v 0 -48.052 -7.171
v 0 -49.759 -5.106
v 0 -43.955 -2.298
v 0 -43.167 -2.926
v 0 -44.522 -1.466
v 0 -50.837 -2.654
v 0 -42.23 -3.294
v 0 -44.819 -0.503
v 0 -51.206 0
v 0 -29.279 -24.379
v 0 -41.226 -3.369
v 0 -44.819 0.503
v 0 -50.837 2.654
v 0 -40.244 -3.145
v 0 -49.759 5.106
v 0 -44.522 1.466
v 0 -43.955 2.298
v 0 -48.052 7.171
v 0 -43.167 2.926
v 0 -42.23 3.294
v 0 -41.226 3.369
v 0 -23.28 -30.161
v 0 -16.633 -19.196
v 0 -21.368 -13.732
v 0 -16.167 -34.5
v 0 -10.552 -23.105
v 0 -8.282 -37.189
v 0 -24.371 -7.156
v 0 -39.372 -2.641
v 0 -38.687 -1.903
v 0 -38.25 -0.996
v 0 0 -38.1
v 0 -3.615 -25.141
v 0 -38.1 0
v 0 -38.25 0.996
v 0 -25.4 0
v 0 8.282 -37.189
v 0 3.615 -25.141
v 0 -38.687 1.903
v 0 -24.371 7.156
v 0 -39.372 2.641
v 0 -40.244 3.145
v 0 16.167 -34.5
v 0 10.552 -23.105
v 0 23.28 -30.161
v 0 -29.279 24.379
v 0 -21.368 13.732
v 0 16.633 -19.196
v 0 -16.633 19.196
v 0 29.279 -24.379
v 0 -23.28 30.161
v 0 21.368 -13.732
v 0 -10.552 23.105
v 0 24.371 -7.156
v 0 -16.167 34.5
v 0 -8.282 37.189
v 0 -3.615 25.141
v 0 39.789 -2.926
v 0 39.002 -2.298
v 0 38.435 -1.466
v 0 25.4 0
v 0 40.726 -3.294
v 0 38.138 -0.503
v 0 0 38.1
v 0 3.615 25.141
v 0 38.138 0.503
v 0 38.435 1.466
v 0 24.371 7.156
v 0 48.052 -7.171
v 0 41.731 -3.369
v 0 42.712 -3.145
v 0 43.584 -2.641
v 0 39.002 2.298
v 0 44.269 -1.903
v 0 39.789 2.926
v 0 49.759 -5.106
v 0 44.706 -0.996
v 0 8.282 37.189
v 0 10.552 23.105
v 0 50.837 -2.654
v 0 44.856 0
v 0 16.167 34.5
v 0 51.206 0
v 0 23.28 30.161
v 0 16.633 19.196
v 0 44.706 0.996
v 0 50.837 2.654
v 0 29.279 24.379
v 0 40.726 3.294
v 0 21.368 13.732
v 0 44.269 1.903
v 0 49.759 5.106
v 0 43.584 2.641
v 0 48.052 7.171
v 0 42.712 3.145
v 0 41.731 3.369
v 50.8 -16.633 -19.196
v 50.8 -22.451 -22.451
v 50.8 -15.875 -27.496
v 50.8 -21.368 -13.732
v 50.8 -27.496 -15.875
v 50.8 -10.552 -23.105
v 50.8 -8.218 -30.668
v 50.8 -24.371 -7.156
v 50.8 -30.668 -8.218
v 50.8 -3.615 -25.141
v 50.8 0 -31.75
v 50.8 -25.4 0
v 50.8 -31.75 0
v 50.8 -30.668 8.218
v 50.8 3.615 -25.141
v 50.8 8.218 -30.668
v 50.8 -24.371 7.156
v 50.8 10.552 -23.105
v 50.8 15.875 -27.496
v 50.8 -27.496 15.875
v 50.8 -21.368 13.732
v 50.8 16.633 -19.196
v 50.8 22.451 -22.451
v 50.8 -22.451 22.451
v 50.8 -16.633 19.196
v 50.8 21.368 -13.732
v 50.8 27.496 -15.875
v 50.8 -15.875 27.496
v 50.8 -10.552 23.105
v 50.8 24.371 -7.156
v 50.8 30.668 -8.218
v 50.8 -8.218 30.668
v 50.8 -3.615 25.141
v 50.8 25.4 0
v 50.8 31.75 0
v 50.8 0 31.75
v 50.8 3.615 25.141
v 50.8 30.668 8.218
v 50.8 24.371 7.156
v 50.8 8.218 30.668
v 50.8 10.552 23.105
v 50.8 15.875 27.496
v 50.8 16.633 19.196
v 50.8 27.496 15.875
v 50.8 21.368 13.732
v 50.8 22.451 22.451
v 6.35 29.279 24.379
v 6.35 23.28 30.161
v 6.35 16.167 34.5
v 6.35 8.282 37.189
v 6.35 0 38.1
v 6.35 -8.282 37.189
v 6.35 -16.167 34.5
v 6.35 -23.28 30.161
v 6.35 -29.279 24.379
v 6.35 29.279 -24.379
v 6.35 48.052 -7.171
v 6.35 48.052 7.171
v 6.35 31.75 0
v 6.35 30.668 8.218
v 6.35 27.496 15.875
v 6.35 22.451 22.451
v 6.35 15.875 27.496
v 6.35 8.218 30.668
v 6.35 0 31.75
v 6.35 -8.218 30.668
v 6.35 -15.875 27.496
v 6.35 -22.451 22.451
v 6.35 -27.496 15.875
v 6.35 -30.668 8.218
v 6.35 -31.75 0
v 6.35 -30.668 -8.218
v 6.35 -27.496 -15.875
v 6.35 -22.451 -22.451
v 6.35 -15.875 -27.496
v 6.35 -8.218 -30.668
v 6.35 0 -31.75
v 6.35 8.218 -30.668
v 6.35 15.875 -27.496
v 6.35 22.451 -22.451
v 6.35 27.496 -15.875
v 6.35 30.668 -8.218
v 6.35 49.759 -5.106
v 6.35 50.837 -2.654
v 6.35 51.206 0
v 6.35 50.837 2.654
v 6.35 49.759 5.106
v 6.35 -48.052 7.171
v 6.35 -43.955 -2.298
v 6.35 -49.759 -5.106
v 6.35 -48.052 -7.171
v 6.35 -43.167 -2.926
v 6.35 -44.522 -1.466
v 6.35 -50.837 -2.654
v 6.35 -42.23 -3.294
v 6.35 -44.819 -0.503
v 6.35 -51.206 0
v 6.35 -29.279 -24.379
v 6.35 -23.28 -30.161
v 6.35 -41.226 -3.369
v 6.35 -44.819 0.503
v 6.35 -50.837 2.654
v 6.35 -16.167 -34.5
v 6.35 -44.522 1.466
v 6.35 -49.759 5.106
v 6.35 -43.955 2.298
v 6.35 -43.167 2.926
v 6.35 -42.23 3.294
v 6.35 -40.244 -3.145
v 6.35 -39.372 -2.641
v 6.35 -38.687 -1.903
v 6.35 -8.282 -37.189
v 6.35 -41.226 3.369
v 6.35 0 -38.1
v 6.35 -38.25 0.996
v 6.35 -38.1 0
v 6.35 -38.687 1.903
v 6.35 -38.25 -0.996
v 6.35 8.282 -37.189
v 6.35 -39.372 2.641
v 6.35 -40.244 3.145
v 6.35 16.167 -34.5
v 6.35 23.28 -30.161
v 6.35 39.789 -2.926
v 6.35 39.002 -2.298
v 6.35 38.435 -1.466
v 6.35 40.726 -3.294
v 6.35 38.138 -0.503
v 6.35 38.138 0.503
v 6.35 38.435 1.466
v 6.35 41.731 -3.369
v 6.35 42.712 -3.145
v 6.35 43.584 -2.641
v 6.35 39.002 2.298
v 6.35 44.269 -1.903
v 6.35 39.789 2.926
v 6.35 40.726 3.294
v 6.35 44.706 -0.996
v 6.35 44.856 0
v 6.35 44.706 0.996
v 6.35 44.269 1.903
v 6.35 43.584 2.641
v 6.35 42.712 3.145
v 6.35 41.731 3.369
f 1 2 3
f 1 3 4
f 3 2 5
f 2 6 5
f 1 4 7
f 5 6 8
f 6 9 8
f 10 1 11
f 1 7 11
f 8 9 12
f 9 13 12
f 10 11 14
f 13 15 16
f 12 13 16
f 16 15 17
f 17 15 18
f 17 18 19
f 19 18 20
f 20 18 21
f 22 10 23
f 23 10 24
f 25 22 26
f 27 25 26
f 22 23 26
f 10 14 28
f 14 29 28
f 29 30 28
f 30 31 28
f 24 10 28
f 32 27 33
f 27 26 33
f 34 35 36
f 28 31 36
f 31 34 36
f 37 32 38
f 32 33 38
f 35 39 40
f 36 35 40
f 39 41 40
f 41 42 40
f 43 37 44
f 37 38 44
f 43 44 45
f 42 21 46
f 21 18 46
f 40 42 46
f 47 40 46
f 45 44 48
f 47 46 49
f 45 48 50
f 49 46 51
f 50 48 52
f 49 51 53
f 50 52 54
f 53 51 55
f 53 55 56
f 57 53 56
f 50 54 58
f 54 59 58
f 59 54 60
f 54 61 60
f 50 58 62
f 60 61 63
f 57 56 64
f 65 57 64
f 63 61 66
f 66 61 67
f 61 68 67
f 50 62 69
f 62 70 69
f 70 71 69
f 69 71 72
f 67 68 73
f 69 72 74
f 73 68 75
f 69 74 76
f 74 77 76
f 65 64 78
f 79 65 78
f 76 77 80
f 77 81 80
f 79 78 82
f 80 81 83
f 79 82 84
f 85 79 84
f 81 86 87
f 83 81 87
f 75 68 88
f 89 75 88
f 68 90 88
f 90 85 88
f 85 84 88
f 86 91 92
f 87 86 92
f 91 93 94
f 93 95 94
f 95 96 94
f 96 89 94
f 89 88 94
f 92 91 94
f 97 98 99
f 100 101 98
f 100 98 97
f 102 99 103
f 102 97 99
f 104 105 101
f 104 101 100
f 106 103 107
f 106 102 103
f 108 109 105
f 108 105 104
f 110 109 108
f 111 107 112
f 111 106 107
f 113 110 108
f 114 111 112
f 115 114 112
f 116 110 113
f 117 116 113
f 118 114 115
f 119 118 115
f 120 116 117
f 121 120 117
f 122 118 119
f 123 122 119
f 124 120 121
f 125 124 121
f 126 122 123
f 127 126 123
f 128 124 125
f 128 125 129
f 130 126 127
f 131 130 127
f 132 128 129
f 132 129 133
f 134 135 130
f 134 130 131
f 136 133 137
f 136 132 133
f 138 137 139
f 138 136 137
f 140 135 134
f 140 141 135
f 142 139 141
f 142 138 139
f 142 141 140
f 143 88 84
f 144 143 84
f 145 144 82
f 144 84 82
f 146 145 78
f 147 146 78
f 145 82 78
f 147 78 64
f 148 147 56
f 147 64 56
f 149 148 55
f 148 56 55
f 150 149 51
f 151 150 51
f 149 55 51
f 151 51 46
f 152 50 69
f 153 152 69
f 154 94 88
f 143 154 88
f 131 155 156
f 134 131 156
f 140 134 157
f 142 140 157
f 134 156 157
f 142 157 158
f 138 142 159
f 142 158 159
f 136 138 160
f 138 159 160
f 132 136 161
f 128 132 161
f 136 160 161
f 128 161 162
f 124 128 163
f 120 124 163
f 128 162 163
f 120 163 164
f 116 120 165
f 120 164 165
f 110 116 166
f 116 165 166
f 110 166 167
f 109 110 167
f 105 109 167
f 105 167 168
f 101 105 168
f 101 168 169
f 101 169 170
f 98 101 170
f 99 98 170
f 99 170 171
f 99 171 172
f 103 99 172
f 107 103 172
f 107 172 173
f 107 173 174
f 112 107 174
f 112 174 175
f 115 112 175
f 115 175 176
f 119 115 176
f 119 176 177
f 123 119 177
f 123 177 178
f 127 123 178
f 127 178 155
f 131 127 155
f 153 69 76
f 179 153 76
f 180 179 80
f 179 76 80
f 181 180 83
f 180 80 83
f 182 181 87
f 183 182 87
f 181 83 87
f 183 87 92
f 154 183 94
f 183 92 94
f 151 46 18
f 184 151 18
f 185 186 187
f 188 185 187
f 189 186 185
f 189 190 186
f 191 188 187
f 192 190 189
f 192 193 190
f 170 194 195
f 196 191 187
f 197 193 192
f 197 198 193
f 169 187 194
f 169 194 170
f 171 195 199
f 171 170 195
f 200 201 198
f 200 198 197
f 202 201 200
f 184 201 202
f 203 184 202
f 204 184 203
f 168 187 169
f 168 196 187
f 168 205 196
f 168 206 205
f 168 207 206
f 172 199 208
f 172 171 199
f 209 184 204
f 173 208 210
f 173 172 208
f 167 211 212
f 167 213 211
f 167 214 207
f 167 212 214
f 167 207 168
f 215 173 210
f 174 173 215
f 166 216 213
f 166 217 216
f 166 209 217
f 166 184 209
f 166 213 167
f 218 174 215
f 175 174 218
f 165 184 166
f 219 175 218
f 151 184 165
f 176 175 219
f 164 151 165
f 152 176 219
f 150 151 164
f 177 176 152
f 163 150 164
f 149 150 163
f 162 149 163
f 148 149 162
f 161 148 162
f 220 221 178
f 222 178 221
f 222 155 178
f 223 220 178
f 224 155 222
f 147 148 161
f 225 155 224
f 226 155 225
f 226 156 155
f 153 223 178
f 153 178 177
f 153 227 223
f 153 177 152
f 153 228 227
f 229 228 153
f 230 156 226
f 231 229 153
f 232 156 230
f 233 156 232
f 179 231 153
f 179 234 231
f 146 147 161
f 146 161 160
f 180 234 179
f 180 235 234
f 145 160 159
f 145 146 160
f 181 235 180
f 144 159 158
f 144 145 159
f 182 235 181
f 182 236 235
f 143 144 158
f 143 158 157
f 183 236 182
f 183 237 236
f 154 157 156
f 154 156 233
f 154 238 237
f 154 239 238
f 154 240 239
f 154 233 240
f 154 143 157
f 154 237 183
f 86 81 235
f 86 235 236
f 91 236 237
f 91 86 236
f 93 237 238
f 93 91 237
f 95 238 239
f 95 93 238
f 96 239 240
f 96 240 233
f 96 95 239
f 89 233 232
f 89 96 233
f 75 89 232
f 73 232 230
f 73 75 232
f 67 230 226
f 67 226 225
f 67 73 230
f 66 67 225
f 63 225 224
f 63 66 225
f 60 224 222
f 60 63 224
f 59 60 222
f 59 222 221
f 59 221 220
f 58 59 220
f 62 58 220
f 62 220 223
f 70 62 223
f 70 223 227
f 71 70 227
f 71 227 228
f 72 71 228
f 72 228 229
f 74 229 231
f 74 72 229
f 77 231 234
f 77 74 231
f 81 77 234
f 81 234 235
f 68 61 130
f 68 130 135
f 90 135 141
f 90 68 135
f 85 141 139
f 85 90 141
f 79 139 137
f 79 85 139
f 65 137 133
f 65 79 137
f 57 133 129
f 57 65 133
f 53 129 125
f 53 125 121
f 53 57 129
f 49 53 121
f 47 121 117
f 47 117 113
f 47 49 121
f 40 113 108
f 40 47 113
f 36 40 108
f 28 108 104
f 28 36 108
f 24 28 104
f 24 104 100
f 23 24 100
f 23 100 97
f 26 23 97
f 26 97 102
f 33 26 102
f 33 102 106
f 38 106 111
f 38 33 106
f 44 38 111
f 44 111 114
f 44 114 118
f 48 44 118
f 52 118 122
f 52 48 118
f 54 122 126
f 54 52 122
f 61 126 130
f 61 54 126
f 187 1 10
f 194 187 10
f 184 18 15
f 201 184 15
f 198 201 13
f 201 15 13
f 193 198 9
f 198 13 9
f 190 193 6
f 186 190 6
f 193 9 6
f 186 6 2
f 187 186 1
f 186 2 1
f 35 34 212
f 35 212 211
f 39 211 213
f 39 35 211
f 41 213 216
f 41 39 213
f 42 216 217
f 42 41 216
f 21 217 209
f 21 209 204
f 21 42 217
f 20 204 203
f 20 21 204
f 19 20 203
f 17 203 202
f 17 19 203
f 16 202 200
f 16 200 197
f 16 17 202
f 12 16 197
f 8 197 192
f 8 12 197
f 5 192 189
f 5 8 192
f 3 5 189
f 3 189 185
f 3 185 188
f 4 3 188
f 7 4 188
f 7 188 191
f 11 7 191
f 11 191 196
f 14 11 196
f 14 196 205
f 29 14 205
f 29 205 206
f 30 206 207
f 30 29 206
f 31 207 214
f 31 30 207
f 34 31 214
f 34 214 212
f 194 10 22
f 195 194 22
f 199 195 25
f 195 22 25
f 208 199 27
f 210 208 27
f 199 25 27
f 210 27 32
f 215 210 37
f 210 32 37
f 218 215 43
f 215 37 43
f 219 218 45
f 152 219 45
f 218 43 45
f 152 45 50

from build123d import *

# Parameters (mm, degrees)
F0_R     = 31.75
F0_R_2   = 25.4
F1_DEPTH = 50.8
F0_R_3   = 3.3782
F2_DEPTH = 6.35


# Not quite as in the source:
# - a feature names something its author has since deleted; it is built from what else it names


with BuildPart() as f1:
    # F0 (on Right) → F1 (new body)
    with BuildSketch(Plane.YZ):
        Circle(F0_R)
        Circle(F0_R_2, mode=Mode.SUBTRACT)
    extrude(amount=F1_DEPTH)

    # F0 (on Right) → F2 (join)
    with BuildSketch(Plane.YZ):
        with BuildLine():
            Line((-48.0517219843, -7.1712400574), (-29.2791039707, -24.3791728874))
            ThreePointArc((-29.2791039707, -24.3791728874), (0, -38.1), (29.2791039707, -24.3791728874))
            Line((29.2791039707, -24.3791728874), (48.0517219843, -7.1712400574))
            ThreePointArc((48.0517219843, -7.1712400574), (51.2064, 0), (48.0517219843, 7.1712400574))
            Line((48.0517219843, 7.1712400574), (29.2791039707, 24.3791728874))
            ThreePointArc((29.2791039707, 24.3791728874), (0, 38.1), (-29.2791039707, 24.3791728874))
            Line((-29.2791039707, 24.3791728874), (-48.0517219843, 7.1712400574))
            ThreePointArc((-48.0517219843, 7.1712400574), (-51.2064, 0), (-48.0517219843, -7.1712400574))
        make_face()
        with Locations((-41.4782, 0)):
            Circle(F0_R_3, mode=Mode.SUBTRACT)
        Circle(F0_R, mode=Mode.SUBTRACT)
        with Locations((41.4782, 0)):
            Circle(F0_R_3, mode=Mode.SUBTRACT)
    extrude(amount=F2_DEPTH)


solid = f1.part
